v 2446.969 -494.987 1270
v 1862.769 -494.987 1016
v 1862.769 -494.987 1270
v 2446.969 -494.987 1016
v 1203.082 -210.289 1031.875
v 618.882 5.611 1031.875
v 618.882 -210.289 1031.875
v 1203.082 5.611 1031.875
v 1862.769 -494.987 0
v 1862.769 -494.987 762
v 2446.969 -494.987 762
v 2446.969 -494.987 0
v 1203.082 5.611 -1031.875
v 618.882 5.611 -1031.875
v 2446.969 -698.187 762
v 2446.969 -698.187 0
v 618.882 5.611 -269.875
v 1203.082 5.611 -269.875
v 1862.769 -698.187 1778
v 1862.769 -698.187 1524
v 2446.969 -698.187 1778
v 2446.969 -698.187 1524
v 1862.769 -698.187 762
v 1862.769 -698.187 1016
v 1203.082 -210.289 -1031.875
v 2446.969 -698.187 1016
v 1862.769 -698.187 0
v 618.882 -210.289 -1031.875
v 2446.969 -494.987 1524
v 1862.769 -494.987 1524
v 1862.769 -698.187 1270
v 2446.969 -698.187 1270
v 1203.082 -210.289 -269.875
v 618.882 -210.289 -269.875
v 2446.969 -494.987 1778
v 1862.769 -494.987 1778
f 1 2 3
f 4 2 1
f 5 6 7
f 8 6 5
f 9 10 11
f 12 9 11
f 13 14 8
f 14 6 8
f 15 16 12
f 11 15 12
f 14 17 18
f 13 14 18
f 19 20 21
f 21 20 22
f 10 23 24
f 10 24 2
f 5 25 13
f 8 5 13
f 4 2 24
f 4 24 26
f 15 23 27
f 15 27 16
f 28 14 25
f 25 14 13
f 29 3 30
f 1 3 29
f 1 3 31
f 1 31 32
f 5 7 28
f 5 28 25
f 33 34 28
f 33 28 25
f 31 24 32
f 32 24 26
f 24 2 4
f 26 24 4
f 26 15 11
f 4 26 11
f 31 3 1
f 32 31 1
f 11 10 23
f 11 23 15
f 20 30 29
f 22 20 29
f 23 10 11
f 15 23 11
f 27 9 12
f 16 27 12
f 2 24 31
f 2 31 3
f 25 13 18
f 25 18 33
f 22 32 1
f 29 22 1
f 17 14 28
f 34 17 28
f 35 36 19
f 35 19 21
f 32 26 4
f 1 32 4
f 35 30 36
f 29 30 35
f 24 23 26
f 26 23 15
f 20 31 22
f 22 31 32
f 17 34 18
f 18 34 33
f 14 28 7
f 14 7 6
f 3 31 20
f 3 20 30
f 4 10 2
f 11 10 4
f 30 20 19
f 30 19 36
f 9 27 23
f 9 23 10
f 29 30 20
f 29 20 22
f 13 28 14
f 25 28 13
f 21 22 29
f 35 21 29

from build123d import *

# Parameters (mm, degrees)
F1_W      = 584.2
F1_H      = 215.9
F2_DEPTH  = 1031.875
F3_W      = 584.2
F3_H      = 215.9
F4_DEPTH  = 762
F5_W      = 584.2
F5_H      = 203.2
F6_DEPTH  = 762
F7_DEPTH  = 254
F8_DEPTH  = 254
F9_DEPTH  = 254
F10_DEPTH = 254


with BuildPart() as f2:
    # F1 (on Top) → F2 (new body, symmetric)
    with BuildSketch(Plane.XY):
        with Locations((910.9823230743, -102.3391206741)):
            Rectangle(F1_W, F1_H)
    extrude(amount=F2_DEPTH, both=True)


with BuildPart() as f4:
    # F3 (on face) → F4 (new body)
    with BuildSketch(Plane(origin=(0, 0, -1031.875), x_dir=(1, 0, 0), z_dir=(0, 0, -1))):
        with Locations((910.9823230743, 102.3391206741)):
            Rectangle(F3_W, F3_H)
    extrude(amount=-F4_DEPTH)


with BuildPart() as f6:
    # F5 (on face) → F6 (new body)
    with BuildSketch(Plane.XY):
        with Locations((2154.8690322876, -596.5868743896)):
            Rectangle(F5_W, F5_H)
    extrude(amount=F6_DEPTH)


with BuildPart() as f7:
    # F7 (new): a face of the model
    f7_faces = [f6.part.faces().sort_by_distance(p)[0] for p in [
        (2154.8690322876, -596.5868743896, 762),
    ]]
    extrude(f7_faces, amount=F7_DEPTH)


with BuildPart() as f8:
    # F8 (new): a face of the model
    f8_faces = [f7.part.faces().sort_by_distance(p)[0] for p in [
        (2154.8690322876, -596.5868743896, 1016),
    ]]
    extrude(f8_faces, amount=F8_DEPTH)


with BuildPart() as f9:
    # F9 (new): a face of the model
    f9_faces = [f8.part.faces().sort_by_distance(p)[0] for p in [
        (2154.8690322876, -596.5868743896, 1270),
    ]]
    extrude(f9_faces, amount=F9_DEPTH)


with BuildPart() as f10:
    # F10 (new): a face of the model
    f10_faces = [f9.part.faces().sort_by_distance(p)[0] for p in [
        (2154.8690322876, -596.5868743896, 1524),
    ]]
    extrude(f10_faces, amount=F10_DEPTH)


solid = Compound([f2.part, f4.part, f6.part, f7.part, f8.part, f9.part, f10.part])
